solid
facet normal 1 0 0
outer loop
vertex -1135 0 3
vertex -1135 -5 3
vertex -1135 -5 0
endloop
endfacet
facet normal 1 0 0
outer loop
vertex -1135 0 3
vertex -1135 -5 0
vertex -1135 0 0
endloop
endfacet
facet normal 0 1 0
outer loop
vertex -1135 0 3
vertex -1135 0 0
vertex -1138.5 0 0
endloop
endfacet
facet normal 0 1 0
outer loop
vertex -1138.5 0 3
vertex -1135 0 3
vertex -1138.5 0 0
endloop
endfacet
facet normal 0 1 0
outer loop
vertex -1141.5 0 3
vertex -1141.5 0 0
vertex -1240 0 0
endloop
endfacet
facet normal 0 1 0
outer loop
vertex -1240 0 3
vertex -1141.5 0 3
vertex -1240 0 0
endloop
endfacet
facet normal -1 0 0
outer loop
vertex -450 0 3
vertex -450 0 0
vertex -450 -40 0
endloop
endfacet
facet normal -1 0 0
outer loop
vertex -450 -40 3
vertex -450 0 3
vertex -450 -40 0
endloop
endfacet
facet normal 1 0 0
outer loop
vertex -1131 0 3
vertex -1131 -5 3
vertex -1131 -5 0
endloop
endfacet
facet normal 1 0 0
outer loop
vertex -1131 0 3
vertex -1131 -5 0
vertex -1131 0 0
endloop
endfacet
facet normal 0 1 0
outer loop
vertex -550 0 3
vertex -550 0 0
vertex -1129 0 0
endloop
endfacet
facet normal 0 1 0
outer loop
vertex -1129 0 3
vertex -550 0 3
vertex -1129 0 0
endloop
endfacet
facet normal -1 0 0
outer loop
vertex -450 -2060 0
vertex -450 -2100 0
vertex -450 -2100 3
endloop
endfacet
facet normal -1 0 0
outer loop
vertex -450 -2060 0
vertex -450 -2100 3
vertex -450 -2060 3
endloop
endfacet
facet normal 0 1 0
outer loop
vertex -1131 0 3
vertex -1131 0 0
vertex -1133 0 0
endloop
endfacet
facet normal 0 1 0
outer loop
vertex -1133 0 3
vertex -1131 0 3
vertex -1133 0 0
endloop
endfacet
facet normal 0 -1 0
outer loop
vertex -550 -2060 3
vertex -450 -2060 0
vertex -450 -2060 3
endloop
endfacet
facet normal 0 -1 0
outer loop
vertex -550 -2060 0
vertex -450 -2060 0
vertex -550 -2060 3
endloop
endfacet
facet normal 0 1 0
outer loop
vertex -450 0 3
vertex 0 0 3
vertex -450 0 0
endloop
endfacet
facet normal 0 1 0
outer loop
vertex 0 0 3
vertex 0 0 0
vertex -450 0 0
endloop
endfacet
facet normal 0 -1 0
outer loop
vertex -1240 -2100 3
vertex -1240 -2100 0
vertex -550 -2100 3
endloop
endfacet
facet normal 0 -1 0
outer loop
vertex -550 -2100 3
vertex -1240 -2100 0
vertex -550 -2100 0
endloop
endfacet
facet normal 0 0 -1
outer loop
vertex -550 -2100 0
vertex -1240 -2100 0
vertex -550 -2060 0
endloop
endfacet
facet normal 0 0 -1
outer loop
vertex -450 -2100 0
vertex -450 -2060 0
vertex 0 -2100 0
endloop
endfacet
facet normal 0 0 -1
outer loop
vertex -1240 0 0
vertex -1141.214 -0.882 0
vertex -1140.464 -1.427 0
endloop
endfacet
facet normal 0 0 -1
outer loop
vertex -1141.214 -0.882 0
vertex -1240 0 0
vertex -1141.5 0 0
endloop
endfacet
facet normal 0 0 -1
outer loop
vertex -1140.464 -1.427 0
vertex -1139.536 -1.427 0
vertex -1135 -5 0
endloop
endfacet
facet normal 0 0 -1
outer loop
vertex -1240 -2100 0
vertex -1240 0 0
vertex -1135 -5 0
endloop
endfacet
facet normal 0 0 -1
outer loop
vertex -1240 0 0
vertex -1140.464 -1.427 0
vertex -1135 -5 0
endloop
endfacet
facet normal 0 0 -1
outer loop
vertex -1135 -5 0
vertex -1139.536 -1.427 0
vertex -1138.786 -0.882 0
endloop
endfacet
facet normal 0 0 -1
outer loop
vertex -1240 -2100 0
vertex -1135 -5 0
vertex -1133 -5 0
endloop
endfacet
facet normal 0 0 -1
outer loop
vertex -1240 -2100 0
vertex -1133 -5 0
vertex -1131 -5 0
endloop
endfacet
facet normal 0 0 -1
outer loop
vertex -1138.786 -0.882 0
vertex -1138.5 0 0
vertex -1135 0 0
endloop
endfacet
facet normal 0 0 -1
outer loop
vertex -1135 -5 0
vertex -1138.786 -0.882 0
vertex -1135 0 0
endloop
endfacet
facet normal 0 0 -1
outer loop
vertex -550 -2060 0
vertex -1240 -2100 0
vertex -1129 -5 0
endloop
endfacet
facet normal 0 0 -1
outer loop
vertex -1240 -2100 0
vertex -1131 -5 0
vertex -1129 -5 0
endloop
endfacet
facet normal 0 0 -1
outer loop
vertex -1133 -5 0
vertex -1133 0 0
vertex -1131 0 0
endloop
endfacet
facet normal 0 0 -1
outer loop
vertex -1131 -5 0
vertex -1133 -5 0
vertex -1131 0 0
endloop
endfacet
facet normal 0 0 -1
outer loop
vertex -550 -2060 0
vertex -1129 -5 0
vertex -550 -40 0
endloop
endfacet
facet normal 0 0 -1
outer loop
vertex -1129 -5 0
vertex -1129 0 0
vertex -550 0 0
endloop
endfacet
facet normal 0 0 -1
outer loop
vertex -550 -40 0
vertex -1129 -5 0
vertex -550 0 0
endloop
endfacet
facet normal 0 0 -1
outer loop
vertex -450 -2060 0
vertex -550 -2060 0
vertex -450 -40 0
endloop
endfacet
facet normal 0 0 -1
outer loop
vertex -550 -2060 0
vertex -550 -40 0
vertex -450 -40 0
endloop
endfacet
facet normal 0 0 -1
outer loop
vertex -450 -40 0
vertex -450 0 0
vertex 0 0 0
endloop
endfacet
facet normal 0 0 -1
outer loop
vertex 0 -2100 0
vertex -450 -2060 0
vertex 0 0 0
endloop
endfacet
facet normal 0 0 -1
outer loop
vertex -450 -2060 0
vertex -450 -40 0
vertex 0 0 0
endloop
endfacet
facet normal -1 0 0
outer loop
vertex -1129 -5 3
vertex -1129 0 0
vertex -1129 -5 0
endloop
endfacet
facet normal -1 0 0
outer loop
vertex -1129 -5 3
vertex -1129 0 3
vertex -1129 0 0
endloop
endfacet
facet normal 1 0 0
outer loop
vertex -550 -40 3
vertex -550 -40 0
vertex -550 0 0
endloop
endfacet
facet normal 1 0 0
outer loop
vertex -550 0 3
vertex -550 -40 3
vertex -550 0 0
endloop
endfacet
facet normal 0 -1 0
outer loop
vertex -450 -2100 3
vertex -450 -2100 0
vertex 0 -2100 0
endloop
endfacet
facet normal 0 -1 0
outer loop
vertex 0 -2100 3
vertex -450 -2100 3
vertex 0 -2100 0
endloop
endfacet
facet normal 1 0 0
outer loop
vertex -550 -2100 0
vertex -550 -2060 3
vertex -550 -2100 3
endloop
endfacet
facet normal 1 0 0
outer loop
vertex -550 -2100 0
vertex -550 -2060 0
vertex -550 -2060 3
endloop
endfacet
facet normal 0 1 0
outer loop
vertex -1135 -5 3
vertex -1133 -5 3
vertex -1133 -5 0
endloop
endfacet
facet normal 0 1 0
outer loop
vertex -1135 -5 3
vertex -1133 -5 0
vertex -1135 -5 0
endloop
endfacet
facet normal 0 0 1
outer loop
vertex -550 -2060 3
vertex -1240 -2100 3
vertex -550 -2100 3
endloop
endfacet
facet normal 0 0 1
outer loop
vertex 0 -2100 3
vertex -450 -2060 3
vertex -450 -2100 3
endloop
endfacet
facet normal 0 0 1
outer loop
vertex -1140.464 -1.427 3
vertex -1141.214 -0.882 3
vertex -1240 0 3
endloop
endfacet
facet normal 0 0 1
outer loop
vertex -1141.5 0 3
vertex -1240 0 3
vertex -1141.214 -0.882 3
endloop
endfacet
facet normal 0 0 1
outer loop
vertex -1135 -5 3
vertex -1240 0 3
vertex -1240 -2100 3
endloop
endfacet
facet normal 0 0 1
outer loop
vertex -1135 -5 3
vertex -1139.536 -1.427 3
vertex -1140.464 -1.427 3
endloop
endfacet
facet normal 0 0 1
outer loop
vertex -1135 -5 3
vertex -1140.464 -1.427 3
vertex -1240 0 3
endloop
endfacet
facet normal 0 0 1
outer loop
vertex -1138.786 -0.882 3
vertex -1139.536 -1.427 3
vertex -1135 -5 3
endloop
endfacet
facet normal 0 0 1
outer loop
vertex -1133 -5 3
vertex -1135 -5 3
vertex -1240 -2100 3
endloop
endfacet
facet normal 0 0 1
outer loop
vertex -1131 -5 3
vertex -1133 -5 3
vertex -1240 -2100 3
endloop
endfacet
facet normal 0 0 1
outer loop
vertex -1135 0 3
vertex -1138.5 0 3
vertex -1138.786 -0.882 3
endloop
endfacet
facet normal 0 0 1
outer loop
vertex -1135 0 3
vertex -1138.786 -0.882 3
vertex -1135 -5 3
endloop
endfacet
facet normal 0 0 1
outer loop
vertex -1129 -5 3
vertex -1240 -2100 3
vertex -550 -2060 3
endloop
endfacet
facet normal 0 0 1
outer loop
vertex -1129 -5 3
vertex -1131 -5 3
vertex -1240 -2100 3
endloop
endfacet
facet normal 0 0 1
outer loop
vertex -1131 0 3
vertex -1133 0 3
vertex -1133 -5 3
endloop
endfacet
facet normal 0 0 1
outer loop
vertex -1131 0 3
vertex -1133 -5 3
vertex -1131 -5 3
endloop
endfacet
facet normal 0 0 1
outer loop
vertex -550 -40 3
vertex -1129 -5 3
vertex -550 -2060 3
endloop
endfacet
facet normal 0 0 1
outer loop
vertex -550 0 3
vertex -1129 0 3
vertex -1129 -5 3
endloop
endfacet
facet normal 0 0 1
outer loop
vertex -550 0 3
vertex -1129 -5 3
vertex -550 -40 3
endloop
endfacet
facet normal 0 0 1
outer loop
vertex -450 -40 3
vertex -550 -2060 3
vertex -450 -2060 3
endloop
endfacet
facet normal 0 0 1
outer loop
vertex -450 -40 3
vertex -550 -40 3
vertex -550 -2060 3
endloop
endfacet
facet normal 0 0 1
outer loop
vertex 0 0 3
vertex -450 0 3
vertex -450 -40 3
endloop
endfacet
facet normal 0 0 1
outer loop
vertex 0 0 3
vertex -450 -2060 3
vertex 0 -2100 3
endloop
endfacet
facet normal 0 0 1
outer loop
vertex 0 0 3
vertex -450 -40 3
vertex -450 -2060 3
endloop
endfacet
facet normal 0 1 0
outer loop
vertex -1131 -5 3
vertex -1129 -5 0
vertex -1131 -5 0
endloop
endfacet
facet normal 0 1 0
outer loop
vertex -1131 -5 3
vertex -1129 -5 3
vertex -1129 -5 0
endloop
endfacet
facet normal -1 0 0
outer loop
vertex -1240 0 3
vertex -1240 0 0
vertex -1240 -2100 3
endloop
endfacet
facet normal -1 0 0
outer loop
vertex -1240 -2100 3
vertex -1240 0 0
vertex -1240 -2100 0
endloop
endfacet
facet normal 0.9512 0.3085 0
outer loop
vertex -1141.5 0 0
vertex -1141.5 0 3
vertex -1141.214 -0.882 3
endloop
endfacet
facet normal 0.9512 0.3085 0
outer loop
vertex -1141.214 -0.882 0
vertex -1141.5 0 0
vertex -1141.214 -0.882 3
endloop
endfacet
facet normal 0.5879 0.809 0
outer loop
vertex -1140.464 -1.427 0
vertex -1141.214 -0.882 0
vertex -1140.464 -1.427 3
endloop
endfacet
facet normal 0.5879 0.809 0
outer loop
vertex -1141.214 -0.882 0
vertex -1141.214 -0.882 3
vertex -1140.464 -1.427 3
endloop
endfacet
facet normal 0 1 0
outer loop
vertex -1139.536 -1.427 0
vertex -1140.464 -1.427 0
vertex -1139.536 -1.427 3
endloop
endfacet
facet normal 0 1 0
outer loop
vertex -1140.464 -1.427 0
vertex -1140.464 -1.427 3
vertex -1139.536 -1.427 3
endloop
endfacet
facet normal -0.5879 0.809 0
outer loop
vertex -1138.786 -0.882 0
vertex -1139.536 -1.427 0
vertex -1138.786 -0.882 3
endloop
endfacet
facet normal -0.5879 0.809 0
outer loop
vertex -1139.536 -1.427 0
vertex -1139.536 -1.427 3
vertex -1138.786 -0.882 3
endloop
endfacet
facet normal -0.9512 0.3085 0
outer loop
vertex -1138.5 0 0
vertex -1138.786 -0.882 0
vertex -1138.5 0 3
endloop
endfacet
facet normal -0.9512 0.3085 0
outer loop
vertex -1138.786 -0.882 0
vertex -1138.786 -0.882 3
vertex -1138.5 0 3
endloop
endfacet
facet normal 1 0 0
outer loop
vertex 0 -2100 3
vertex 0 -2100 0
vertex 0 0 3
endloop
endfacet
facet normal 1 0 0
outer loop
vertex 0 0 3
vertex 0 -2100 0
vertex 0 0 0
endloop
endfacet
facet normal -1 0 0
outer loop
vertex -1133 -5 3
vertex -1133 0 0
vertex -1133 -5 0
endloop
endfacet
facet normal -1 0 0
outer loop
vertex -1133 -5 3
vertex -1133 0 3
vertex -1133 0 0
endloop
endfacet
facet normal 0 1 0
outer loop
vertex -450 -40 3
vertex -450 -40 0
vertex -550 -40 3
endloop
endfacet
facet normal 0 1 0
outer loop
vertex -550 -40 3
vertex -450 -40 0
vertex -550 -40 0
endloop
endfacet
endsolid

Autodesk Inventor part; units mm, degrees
ref_plane "YZ Plane" through (0, 0, 0) normal (1, 0, 0) x (0, 1, 0)
ref_plane "XZ Plane" through (0, 0, 0) normal (0, 1, 0) x (-1, 0, 0)
ref_plane "XY Plane" through (0, 0, 0) normal (0, 0, 1) x (1, 0, 0)
sketch "Sketch1" plane through (0, 0, 0) normal (0, 0, 1) x (1, 0, 0)
  line L0 (0, 0) -> (-1240, 0)
  line L1 (-1240, 0) -> (-1240, -2100)
  line L2 (-1240, -2100) -> (0, -2100)
  line L3 (0, -2100) -> (0, 0)
  line L4 (0, 0) -> (-40, 0)
  line L5 (-40, 0) -> (-40, -40)
  line L6 (-40, -40) -> (0, -40)
  line L7 (0, -40) -> (0, 0)
  line L8 (0, -2100) -> (-40, -2100)
  line L9 (-40, -2100) -> (-40, -2060)
  line L10 (-40, -2060) -> (0, -2060)
  line L11 (0, -2060) -> (0, -2100)
  line L12 (-1240, 0) -> (-1200, 0)
  line L13 (-1200, 0) -> (-1200, -40)
  line L14 (-1200, -40) -> (-1240, -40)
  line L15 (-1240, -40) -> (-1240, 0)
  line L16 (-1240, -2100) -> (-1200, -2100)
  line L17 (-1200, -2100) -> (-1200, -2060)
  line L18 (-1200, -2060) -> (-1240, -2060)
  line L19 (-1240, -2060) -> (-1240, -2100)
  line L20 (-550, -2100) -> (-450, -2100)
  line L21 (-450, -2100) -> (-450, -2060)
  line L22 (-450, -2060) -> (-550, -2060)
  line L23 (-550, -2060) -> (-550, -2100)
  line L24 (-550, 0) -> (-450, 0)
  line L25 (-450, 0) -> (-450, -40)
  line L26 (-450, -40) -> (-550, -40)
  line L27 (-550, -40) -> (-550, 0)
  point P0 (0, -40)
  point P1 (-40, 0)
  point P2 (-40, -2100)
  point P3 (0, -2060)
  point P4 (-450, -2100)
  point P5 (-450, 0)
  dimension "d22" = 1240
  dimension "d23" = 2100
  dimension "d24" = 40
  dimension "d25" = 40
  dimension "d28" = 100
  dimension "d29" = 410
extrude "Plate1" add sketch "Sketch1" along normal blind 3 contours L3 L6 L5 L0 | L5 L6 L3 L10 L9 L2 L21 L22 L23 L17 L18 L1 L14 L13 L0 L27 L26 L25 | L3 L2 L9 L10 | L13 L14 L1 L0 | L18 L17 L2 L1
sketch "Sketch6" plane through (0, 0, 3) normal (0, 0, 1) x (1, 0, 0)
  line L0 (0, 0) -> (0, -2100) projected
  line L1 (-450, 0) -> (0, 0) projected
  line L2 (-450, -40) -> (-450, 0) projected
  line L3 (-550, -40) -> (-450, -40) projected
  line L4 (-550, 0) -> (-550, -40) projected
  line L5 (-1240, 0) -> (-550, 0) projected
  line L6 (-1240, -2100) -> (-1240, 0) projected
  line L7 (-550, -2100) -> (-1240, -2100) projected
  line L8 (-550, -2060) -> (-550, -2100) projected
  line L9 (-450, -2060) -> (-550, -2060) projected
  line L10 (-450, -2100) -> (-450, -2060) projected
  line L11 (0, -2100) -> (-450, -2100) projected
  line L12 (-1135, 0) -> (-1133, 0)
  line L13 (-1133, 0) -> (-1133, -5)
  line L14 (-1133, -5) -> (-1135, -5)
  line L15 (-1135, -5) -> (-1135, 0)
  line L16 (-1127, 0) -> (-1125, 0)
  line L17 (-1125, 0) -> (-1125, -5)
  line L18 (-1125, -5) -> (-1127, -5)
  line L19 (-1127, -5) -> (-1127, 0)
  line L20 (-1131, 0) -> (-1129, 0)
  line L21 (-1129, 0) -> (-1129, -5)
  line L22 (-1129, -5) -> (-1131, -5)
  line L23 (-1131, -5) -> (-1131, 0)
  line L24 (-1133, -2.5) -> (-1131, -2.5)
  line L25 (-1123, 0) -> (-1120, 0)
  line L26 (-1129, -2.5) -> (-1127, -2.5)
  line L27 (-1123, 0) -> (-1121.9884, -4.6072)
  arc A0 (-1121.9884, -4.6072) -> (-1121.0116, -4.6072) centre (-1121.5, -4.5) ccw
  line L28 (-1121.0116, -4.6072) -> (-1120, 0)
  line L29 (-1125, 0) -> (-1123, 0)
  line L30 (-1112, -5) -> (-1114, -5)
  line L31 (-1112, -2.5) -> (-1110, -2.5)
  line L32 (-1116, -5) -> (-1118, -5)
  line L33 (-1116, -2.5) -> (-1114, -2.5)
  line L34 (-1114, 0) -> (-1112, 0)
  line L35 (-1114, -5) -> (-1114, 0)
  line L36 (-1118, 0) -> (-1116, 0)
  line L37 (-1118, -5) -> (-1118, 0)
  line L38 (-1116, 0) -> (-1116, -5)
  line L39 (-1112, 0) -> (-1112, -5)
  line L40 (-1110, -5) -> (-1110, 0)
  line L41 (-1110, 0) -> (-1108, 0)
  line L42 (-1108, 0) -> (-1108, -5)
  line L43 (-1108, -5) -> (-1110, -5)
  line L44 (-1120, 0) -> (-1118, 0)
  circle A1 centre (-1140, 0) radius 1.5
  line L45 (-1240, 0) -> (-550, 0) projected
  point P0 (-1121.5, 0)
  point P1 (-1138.5, 0)
  point P2 (-1141.5, 0)
  point P3 (-1133, 0)
  point P4 (-1135, 0)
  point P5 (-1129, 0)
  point P6 (-1131, 0)
  dimension "d38" = 2
  dimension "d39" = 5
  dimension "d40" = 0.5
  dimension "d41" = 3
  dimension "d42" = 2
  dimension "d43" = 5
  dimension "d44" = 3
  dimension "d45" = 5
  dimension "d46" = 100
extrude "Cut1" cut sketch "Sketch6" against normal blind 3 contours L5 A1 | L5 L13 L14 L15 | L5 L21 L22 L23 picked at (-1140.0603, -0.4964)
equation "\"d24\" = d25"
equation "\"d40\" = 0.25 * d38"
equation "\"d47\" = Thickness"
equation "\"d2\" = Thickness"
equation "\"BendReliefWidth\" = Thickness"
equation "\"BendReliefDepth\" = 0.5 * Thickness"
equation "\"CornerReliefSize\" = 4 * Thickness"
equation "\"MinimumRemnant\" = 2 * Thickness"
equation "\"TransitionRadius\" = BendRadius"
equation "\"JacobiRadiusSize\" = BendRadius"
equation "\"GapSize\" = Thickness"
equation "\"Thickness\" = 3"
equation "\"BendRadius\" = 5"
properties part number "GnG frame 1.1 floor sheet 2" material "Stainless Steel"
